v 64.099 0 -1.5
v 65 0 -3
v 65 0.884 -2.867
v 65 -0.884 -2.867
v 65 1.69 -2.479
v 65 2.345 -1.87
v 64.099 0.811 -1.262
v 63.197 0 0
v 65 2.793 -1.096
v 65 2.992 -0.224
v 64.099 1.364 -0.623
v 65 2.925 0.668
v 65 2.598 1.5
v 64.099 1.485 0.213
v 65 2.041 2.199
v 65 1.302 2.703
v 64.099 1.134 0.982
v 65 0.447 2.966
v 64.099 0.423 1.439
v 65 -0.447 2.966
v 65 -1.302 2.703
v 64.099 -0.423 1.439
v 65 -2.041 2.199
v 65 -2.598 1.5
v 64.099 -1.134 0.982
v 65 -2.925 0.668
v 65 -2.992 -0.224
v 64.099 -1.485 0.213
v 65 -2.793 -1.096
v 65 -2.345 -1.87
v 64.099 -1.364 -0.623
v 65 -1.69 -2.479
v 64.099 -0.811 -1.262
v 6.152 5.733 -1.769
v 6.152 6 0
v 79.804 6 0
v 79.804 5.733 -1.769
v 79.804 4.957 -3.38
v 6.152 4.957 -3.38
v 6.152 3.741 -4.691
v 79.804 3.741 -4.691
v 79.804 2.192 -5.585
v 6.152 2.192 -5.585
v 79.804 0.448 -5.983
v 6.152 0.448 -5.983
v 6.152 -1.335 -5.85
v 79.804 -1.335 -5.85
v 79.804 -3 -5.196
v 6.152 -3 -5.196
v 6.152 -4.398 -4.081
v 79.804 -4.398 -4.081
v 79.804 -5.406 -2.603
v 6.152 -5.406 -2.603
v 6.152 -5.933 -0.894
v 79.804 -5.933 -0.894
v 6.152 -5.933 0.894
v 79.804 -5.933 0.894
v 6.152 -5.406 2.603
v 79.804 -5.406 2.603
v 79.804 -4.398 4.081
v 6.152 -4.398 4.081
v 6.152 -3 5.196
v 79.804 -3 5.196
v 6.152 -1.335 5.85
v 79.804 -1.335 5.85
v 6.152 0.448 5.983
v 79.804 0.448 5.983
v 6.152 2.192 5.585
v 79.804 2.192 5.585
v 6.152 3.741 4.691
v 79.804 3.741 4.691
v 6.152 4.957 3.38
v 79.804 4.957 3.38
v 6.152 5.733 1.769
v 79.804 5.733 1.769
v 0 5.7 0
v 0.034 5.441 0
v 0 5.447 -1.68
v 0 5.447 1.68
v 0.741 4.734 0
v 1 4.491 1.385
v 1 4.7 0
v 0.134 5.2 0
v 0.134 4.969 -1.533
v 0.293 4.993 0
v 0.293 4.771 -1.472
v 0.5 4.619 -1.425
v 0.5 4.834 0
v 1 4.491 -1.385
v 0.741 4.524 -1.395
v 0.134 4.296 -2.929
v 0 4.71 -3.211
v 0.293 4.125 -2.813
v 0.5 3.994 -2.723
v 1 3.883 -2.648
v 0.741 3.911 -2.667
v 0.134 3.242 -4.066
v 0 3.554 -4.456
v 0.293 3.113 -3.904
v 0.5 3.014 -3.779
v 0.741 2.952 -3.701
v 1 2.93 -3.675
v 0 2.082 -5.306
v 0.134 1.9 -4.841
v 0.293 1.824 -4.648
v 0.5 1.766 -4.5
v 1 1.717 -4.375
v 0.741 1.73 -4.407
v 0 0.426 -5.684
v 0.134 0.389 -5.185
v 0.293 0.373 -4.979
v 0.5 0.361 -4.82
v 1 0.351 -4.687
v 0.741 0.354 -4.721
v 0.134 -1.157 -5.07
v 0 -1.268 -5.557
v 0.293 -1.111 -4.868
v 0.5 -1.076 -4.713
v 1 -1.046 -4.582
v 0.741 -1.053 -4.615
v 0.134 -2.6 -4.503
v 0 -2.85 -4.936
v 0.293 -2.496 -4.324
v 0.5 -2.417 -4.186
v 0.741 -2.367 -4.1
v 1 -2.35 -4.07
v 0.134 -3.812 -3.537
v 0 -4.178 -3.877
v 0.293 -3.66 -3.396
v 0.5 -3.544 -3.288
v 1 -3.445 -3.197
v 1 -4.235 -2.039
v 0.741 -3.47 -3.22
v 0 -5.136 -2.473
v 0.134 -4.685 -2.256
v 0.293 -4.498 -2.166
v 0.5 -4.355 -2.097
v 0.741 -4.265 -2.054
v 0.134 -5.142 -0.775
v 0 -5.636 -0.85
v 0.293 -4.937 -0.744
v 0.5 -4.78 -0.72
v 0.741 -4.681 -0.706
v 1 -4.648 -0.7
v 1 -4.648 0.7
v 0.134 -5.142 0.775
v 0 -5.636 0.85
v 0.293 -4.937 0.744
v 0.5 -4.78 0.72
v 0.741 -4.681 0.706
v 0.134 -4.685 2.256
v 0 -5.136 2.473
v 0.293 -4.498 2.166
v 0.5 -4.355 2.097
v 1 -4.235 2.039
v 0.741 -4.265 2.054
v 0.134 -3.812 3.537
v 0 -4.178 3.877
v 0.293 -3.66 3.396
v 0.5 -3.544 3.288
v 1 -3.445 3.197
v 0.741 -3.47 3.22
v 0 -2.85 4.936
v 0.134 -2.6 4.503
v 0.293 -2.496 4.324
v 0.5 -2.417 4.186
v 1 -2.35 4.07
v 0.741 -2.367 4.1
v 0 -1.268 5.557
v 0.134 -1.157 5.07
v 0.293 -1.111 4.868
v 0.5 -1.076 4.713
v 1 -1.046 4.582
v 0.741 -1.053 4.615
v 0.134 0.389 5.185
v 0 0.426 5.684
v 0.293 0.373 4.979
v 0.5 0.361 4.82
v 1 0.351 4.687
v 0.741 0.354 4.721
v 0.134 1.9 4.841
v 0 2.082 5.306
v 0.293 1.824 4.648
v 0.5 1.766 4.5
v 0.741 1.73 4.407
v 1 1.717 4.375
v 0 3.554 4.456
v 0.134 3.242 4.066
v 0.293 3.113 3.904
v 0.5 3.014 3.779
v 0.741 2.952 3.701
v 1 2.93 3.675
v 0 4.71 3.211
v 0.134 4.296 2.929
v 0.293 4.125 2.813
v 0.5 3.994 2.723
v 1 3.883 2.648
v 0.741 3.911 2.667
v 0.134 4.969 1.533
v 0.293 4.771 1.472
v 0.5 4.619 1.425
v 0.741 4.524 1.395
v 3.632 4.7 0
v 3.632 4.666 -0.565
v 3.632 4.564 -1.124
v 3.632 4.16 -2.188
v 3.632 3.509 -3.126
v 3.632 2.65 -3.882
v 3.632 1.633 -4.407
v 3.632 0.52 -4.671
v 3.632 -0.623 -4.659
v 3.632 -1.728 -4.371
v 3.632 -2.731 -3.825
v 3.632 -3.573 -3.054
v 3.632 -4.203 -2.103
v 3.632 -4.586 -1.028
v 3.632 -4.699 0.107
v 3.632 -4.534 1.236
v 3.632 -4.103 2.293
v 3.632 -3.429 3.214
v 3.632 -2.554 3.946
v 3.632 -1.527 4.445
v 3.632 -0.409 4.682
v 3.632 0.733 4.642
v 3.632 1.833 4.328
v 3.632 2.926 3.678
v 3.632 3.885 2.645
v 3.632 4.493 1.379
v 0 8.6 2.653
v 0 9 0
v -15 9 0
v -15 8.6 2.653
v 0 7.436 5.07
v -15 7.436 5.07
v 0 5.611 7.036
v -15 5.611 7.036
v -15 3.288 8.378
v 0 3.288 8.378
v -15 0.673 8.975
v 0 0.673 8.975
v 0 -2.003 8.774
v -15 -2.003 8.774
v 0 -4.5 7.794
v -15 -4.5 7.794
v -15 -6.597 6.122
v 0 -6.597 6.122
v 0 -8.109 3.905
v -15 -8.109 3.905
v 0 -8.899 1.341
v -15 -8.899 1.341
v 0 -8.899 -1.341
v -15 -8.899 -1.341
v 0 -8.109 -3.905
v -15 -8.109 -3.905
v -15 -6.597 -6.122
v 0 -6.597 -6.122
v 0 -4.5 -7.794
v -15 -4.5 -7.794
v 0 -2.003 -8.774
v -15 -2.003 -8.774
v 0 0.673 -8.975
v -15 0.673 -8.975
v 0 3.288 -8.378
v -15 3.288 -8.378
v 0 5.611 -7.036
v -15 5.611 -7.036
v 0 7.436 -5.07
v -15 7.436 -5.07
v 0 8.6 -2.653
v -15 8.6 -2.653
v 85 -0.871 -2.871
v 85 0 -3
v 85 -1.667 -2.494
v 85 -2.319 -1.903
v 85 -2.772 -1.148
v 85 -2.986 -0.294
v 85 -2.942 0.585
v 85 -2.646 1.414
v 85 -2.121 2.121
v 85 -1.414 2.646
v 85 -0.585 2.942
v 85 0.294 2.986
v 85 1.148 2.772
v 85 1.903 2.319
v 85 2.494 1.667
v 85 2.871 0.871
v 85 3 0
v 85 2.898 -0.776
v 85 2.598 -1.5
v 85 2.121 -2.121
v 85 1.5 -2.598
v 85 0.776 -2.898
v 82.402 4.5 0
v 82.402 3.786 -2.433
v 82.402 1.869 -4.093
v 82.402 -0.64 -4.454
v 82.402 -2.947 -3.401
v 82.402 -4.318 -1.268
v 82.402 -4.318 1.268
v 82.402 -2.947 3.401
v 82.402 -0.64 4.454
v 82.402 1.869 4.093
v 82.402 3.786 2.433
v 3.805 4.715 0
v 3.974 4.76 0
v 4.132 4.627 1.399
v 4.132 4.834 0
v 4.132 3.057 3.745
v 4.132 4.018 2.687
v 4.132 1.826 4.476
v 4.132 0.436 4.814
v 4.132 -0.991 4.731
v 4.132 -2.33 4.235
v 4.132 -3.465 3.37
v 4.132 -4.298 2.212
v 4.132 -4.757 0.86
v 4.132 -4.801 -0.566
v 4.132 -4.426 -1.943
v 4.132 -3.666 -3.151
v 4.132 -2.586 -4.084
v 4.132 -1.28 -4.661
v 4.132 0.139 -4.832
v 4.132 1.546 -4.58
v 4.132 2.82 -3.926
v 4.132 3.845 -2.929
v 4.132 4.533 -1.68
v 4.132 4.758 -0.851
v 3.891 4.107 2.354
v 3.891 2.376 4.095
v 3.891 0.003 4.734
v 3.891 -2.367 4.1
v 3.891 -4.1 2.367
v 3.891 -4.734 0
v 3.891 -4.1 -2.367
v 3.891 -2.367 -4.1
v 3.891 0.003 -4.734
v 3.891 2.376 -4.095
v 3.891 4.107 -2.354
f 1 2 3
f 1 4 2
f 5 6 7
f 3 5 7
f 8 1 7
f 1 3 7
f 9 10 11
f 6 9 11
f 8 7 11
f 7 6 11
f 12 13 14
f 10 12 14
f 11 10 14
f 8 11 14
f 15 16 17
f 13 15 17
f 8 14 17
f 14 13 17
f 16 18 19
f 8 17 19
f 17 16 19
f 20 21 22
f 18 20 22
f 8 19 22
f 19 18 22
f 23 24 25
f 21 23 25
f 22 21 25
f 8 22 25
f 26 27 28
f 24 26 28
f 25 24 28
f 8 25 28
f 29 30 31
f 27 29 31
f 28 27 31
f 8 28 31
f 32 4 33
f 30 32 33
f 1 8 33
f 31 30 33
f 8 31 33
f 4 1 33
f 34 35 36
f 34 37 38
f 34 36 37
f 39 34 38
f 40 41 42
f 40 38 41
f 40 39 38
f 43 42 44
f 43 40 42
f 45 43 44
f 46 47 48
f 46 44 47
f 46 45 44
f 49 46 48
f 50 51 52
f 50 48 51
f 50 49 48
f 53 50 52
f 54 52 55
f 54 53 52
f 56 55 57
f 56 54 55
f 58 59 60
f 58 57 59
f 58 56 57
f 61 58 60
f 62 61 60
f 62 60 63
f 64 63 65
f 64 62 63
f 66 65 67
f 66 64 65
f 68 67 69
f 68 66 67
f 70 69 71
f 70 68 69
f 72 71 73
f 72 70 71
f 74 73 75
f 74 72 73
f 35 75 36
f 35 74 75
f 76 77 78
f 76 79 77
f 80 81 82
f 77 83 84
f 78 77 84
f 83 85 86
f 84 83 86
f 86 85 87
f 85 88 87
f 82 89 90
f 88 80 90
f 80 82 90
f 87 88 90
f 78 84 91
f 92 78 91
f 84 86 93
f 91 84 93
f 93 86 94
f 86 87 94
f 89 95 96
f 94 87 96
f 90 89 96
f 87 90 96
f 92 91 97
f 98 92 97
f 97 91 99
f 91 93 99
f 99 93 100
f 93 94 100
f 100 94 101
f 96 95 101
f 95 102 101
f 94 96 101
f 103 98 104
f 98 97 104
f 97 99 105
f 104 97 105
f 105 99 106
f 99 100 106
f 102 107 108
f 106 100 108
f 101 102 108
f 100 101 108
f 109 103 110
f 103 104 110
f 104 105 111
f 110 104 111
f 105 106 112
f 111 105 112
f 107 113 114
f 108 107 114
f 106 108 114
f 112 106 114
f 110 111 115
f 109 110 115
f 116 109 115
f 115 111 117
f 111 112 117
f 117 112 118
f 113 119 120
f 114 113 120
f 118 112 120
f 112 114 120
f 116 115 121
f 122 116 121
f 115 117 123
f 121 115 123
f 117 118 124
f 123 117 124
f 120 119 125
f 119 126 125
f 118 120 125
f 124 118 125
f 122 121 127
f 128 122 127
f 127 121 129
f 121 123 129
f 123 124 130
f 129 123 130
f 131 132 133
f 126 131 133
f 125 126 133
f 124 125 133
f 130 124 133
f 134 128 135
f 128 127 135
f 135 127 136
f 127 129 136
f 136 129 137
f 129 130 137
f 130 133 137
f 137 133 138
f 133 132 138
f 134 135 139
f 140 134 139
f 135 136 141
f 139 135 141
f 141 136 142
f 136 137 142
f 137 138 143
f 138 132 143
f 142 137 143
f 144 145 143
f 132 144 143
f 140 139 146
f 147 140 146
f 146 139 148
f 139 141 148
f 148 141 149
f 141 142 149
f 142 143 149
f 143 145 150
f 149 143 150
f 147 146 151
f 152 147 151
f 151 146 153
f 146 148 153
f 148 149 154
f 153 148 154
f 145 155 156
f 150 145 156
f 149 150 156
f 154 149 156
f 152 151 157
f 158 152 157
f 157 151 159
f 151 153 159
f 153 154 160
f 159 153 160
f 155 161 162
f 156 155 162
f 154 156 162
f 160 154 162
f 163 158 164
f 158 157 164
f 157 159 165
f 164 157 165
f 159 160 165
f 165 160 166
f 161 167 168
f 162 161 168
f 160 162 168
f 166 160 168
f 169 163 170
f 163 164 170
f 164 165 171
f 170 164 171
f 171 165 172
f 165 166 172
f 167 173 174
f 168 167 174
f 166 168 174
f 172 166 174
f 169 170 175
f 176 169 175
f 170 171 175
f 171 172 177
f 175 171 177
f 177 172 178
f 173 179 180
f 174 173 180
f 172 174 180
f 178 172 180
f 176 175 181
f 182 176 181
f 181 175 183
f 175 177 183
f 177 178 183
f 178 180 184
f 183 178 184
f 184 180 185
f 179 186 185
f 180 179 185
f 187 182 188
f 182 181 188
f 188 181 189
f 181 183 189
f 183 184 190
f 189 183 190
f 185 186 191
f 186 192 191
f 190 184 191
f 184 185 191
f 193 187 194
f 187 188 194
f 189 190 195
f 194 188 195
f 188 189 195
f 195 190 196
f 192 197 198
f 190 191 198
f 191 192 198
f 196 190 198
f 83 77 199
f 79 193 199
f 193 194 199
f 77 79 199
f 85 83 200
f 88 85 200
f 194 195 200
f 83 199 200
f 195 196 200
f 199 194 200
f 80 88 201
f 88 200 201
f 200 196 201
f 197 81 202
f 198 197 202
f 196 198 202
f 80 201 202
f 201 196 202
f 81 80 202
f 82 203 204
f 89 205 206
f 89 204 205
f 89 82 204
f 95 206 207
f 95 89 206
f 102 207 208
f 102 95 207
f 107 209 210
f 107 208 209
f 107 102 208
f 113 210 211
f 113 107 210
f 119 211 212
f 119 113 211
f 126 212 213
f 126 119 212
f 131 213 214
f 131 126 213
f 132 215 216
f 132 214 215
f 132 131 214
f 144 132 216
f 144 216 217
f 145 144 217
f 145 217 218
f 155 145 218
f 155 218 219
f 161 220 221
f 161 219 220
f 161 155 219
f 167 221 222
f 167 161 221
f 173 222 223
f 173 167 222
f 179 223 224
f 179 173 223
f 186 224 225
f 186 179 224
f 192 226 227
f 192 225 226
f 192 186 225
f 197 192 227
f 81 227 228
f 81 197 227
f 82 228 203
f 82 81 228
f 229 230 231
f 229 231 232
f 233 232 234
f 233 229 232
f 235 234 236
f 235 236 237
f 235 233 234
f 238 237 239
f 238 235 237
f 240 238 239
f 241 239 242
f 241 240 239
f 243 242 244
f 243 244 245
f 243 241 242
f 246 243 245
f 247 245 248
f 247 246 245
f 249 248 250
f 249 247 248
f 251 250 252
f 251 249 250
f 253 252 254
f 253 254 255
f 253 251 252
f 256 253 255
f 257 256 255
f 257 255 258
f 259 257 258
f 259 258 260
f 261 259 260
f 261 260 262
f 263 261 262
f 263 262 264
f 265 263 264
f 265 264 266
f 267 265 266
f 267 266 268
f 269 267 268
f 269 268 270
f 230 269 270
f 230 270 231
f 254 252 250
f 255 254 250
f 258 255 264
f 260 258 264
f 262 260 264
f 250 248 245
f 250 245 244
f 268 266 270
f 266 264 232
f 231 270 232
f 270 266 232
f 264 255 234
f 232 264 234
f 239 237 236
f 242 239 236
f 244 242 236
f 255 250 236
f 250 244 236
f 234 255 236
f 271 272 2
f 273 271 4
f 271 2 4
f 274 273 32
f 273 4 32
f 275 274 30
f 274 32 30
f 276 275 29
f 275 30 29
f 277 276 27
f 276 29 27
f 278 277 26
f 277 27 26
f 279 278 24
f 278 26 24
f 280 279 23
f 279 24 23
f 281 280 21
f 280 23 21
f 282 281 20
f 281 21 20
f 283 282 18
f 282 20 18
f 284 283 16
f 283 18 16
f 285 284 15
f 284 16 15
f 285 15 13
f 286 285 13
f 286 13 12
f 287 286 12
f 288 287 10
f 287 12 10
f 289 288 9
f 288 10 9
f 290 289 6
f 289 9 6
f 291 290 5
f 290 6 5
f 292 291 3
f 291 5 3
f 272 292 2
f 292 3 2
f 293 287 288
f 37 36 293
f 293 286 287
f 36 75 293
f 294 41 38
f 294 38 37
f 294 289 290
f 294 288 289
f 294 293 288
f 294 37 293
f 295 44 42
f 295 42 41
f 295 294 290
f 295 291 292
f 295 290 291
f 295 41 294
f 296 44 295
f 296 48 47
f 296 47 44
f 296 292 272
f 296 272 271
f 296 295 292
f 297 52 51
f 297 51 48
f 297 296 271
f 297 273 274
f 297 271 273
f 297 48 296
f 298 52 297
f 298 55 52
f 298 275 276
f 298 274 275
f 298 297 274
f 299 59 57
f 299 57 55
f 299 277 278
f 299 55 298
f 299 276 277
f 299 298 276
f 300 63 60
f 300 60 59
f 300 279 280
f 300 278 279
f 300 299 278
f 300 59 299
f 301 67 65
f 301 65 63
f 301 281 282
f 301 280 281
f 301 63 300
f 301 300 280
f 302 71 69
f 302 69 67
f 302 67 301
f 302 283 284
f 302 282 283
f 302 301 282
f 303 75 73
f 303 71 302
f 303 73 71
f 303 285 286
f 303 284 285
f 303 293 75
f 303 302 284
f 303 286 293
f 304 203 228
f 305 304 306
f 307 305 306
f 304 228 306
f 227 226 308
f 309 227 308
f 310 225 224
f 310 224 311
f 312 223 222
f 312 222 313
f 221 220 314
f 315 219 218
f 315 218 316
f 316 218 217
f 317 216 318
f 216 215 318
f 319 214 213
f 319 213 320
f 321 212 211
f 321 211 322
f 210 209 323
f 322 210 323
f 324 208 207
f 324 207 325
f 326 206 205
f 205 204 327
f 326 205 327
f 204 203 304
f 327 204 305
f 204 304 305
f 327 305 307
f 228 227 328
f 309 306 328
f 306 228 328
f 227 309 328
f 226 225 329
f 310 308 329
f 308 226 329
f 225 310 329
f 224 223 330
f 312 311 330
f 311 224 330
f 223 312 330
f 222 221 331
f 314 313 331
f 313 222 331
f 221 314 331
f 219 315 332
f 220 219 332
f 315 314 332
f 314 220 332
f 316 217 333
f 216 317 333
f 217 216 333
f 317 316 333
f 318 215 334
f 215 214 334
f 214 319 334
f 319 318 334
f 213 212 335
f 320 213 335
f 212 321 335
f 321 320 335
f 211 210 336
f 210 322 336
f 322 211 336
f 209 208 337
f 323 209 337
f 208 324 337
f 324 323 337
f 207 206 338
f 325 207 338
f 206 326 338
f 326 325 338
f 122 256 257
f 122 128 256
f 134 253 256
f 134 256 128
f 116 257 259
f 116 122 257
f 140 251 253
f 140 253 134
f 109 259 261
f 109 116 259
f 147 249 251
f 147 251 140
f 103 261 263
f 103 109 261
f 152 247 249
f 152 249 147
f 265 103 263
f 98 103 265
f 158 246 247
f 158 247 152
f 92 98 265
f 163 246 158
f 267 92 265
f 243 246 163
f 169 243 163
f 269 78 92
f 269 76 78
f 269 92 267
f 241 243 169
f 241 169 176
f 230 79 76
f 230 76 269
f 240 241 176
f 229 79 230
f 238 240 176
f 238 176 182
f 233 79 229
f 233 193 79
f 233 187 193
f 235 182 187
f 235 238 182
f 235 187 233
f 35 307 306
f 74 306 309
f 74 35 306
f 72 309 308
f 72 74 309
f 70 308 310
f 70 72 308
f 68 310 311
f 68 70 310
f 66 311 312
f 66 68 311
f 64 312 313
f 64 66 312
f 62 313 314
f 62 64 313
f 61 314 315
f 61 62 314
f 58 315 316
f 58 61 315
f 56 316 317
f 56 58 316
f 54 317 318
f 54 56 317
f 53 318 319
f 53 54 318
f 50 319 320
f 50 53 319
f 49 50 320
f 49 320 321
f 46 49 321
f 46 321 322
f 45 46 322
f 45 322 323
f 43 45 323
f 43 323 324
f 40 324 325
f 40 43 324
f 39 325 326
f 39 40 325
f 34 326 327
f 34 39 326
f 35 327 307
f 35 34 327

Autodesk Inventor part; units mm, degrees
ref_plane "YZ Plane" through (0, 0, 0) normal (1, 0, 0) x (0, 1, 0)
ref_plane "XZ Plane" through (0, 0, 0) normal (0, 1, 0) x (-1, 0, 0)
ref_plane "XY Plane" through (0, 0, 0) normal (0, 0, 1) x (1, 0, 0)
sketch "Skizze1" plane through (0, 0, 0) normal (0, 0, 1) x (1, 0, 0)
  line L0 (-35, 0) -> (105, 0) projected
  line L1 (0, -1.8) -> (0, 10.8) projected
  line L2 (0, 0) -> (65, 0)
  line L3 (85, 0) -> (85, 3)
  line L4 (79.8038, 6) -> (6.1517, 6)
  line L5 (0, 6) -> (0, 0)
  line L6 (0, 0) -> (-15, 0)
  line L7 (-15, 0) -> (-15, 9)
  line L8 (-15, 9) -> (0, 9)
  line L9 (0, 9) -> (0, 0)
  line L10 (85, 0) -> (65, 0)
  line L11 (85, 3) -> (85, 0)
  line L12 (85, 3) -> (79.8038, 6)
  line L13 (0, 0) -> (3.9, 0)
  line L14 (3.9, 0) -> (3.9, 4.7)
  line L15 (3.9, 4.7) -> (0, 4.7)
  line L16 (0, 4.7) -> (0, 0)
  line L17 (3.9, 4.7) -> (6.1517, 6)
  point P0 (85, 1.5)
  point P1 (0, 4.7)
  dimension "d2" = 9
  dimension "d3" = 100
  dimension "d7" = 30
  dimension "d8" = 12
  dimension "d10" = 6
  dimension "d11" = 85
  dimension "d12" = 9.4
  dimension "d13" = 3.9
  dimension "d17" = 30
revolve "Umdrehung1" add sketch "Skizze1" angle 360 about axis through (-10, 0, 0) along (1, 0, 0)
sketch "Skizze2" plane through (85, 0, 0) normal (1, 0, 0) x (0, 0, -1)
  point P0 (0, 0)
  point P1 (0, 0)
hole "Bohrung1" at (85, 0, 0) direction (-1, 0, 0) diameter 6 depth 20 tip angle 118
fillet "Rundung1" radius 1 1 edges at (0, -4.7, 0)
fillet "Rundung2" radius 1 1 edges at (3.9, -4.7, 0)
thread "Gewinde1" size "M12x1" class "6g" standard "ANSI Metric M Profile" full length
sketch "Skizze3" plane through (-15, 0, 0) normal (-1, 0, 0) x (0, 0, 1)
  point P0 (0, 0)
properties part number "2.3_Druckschraube" material "1.0038 S235JR"
